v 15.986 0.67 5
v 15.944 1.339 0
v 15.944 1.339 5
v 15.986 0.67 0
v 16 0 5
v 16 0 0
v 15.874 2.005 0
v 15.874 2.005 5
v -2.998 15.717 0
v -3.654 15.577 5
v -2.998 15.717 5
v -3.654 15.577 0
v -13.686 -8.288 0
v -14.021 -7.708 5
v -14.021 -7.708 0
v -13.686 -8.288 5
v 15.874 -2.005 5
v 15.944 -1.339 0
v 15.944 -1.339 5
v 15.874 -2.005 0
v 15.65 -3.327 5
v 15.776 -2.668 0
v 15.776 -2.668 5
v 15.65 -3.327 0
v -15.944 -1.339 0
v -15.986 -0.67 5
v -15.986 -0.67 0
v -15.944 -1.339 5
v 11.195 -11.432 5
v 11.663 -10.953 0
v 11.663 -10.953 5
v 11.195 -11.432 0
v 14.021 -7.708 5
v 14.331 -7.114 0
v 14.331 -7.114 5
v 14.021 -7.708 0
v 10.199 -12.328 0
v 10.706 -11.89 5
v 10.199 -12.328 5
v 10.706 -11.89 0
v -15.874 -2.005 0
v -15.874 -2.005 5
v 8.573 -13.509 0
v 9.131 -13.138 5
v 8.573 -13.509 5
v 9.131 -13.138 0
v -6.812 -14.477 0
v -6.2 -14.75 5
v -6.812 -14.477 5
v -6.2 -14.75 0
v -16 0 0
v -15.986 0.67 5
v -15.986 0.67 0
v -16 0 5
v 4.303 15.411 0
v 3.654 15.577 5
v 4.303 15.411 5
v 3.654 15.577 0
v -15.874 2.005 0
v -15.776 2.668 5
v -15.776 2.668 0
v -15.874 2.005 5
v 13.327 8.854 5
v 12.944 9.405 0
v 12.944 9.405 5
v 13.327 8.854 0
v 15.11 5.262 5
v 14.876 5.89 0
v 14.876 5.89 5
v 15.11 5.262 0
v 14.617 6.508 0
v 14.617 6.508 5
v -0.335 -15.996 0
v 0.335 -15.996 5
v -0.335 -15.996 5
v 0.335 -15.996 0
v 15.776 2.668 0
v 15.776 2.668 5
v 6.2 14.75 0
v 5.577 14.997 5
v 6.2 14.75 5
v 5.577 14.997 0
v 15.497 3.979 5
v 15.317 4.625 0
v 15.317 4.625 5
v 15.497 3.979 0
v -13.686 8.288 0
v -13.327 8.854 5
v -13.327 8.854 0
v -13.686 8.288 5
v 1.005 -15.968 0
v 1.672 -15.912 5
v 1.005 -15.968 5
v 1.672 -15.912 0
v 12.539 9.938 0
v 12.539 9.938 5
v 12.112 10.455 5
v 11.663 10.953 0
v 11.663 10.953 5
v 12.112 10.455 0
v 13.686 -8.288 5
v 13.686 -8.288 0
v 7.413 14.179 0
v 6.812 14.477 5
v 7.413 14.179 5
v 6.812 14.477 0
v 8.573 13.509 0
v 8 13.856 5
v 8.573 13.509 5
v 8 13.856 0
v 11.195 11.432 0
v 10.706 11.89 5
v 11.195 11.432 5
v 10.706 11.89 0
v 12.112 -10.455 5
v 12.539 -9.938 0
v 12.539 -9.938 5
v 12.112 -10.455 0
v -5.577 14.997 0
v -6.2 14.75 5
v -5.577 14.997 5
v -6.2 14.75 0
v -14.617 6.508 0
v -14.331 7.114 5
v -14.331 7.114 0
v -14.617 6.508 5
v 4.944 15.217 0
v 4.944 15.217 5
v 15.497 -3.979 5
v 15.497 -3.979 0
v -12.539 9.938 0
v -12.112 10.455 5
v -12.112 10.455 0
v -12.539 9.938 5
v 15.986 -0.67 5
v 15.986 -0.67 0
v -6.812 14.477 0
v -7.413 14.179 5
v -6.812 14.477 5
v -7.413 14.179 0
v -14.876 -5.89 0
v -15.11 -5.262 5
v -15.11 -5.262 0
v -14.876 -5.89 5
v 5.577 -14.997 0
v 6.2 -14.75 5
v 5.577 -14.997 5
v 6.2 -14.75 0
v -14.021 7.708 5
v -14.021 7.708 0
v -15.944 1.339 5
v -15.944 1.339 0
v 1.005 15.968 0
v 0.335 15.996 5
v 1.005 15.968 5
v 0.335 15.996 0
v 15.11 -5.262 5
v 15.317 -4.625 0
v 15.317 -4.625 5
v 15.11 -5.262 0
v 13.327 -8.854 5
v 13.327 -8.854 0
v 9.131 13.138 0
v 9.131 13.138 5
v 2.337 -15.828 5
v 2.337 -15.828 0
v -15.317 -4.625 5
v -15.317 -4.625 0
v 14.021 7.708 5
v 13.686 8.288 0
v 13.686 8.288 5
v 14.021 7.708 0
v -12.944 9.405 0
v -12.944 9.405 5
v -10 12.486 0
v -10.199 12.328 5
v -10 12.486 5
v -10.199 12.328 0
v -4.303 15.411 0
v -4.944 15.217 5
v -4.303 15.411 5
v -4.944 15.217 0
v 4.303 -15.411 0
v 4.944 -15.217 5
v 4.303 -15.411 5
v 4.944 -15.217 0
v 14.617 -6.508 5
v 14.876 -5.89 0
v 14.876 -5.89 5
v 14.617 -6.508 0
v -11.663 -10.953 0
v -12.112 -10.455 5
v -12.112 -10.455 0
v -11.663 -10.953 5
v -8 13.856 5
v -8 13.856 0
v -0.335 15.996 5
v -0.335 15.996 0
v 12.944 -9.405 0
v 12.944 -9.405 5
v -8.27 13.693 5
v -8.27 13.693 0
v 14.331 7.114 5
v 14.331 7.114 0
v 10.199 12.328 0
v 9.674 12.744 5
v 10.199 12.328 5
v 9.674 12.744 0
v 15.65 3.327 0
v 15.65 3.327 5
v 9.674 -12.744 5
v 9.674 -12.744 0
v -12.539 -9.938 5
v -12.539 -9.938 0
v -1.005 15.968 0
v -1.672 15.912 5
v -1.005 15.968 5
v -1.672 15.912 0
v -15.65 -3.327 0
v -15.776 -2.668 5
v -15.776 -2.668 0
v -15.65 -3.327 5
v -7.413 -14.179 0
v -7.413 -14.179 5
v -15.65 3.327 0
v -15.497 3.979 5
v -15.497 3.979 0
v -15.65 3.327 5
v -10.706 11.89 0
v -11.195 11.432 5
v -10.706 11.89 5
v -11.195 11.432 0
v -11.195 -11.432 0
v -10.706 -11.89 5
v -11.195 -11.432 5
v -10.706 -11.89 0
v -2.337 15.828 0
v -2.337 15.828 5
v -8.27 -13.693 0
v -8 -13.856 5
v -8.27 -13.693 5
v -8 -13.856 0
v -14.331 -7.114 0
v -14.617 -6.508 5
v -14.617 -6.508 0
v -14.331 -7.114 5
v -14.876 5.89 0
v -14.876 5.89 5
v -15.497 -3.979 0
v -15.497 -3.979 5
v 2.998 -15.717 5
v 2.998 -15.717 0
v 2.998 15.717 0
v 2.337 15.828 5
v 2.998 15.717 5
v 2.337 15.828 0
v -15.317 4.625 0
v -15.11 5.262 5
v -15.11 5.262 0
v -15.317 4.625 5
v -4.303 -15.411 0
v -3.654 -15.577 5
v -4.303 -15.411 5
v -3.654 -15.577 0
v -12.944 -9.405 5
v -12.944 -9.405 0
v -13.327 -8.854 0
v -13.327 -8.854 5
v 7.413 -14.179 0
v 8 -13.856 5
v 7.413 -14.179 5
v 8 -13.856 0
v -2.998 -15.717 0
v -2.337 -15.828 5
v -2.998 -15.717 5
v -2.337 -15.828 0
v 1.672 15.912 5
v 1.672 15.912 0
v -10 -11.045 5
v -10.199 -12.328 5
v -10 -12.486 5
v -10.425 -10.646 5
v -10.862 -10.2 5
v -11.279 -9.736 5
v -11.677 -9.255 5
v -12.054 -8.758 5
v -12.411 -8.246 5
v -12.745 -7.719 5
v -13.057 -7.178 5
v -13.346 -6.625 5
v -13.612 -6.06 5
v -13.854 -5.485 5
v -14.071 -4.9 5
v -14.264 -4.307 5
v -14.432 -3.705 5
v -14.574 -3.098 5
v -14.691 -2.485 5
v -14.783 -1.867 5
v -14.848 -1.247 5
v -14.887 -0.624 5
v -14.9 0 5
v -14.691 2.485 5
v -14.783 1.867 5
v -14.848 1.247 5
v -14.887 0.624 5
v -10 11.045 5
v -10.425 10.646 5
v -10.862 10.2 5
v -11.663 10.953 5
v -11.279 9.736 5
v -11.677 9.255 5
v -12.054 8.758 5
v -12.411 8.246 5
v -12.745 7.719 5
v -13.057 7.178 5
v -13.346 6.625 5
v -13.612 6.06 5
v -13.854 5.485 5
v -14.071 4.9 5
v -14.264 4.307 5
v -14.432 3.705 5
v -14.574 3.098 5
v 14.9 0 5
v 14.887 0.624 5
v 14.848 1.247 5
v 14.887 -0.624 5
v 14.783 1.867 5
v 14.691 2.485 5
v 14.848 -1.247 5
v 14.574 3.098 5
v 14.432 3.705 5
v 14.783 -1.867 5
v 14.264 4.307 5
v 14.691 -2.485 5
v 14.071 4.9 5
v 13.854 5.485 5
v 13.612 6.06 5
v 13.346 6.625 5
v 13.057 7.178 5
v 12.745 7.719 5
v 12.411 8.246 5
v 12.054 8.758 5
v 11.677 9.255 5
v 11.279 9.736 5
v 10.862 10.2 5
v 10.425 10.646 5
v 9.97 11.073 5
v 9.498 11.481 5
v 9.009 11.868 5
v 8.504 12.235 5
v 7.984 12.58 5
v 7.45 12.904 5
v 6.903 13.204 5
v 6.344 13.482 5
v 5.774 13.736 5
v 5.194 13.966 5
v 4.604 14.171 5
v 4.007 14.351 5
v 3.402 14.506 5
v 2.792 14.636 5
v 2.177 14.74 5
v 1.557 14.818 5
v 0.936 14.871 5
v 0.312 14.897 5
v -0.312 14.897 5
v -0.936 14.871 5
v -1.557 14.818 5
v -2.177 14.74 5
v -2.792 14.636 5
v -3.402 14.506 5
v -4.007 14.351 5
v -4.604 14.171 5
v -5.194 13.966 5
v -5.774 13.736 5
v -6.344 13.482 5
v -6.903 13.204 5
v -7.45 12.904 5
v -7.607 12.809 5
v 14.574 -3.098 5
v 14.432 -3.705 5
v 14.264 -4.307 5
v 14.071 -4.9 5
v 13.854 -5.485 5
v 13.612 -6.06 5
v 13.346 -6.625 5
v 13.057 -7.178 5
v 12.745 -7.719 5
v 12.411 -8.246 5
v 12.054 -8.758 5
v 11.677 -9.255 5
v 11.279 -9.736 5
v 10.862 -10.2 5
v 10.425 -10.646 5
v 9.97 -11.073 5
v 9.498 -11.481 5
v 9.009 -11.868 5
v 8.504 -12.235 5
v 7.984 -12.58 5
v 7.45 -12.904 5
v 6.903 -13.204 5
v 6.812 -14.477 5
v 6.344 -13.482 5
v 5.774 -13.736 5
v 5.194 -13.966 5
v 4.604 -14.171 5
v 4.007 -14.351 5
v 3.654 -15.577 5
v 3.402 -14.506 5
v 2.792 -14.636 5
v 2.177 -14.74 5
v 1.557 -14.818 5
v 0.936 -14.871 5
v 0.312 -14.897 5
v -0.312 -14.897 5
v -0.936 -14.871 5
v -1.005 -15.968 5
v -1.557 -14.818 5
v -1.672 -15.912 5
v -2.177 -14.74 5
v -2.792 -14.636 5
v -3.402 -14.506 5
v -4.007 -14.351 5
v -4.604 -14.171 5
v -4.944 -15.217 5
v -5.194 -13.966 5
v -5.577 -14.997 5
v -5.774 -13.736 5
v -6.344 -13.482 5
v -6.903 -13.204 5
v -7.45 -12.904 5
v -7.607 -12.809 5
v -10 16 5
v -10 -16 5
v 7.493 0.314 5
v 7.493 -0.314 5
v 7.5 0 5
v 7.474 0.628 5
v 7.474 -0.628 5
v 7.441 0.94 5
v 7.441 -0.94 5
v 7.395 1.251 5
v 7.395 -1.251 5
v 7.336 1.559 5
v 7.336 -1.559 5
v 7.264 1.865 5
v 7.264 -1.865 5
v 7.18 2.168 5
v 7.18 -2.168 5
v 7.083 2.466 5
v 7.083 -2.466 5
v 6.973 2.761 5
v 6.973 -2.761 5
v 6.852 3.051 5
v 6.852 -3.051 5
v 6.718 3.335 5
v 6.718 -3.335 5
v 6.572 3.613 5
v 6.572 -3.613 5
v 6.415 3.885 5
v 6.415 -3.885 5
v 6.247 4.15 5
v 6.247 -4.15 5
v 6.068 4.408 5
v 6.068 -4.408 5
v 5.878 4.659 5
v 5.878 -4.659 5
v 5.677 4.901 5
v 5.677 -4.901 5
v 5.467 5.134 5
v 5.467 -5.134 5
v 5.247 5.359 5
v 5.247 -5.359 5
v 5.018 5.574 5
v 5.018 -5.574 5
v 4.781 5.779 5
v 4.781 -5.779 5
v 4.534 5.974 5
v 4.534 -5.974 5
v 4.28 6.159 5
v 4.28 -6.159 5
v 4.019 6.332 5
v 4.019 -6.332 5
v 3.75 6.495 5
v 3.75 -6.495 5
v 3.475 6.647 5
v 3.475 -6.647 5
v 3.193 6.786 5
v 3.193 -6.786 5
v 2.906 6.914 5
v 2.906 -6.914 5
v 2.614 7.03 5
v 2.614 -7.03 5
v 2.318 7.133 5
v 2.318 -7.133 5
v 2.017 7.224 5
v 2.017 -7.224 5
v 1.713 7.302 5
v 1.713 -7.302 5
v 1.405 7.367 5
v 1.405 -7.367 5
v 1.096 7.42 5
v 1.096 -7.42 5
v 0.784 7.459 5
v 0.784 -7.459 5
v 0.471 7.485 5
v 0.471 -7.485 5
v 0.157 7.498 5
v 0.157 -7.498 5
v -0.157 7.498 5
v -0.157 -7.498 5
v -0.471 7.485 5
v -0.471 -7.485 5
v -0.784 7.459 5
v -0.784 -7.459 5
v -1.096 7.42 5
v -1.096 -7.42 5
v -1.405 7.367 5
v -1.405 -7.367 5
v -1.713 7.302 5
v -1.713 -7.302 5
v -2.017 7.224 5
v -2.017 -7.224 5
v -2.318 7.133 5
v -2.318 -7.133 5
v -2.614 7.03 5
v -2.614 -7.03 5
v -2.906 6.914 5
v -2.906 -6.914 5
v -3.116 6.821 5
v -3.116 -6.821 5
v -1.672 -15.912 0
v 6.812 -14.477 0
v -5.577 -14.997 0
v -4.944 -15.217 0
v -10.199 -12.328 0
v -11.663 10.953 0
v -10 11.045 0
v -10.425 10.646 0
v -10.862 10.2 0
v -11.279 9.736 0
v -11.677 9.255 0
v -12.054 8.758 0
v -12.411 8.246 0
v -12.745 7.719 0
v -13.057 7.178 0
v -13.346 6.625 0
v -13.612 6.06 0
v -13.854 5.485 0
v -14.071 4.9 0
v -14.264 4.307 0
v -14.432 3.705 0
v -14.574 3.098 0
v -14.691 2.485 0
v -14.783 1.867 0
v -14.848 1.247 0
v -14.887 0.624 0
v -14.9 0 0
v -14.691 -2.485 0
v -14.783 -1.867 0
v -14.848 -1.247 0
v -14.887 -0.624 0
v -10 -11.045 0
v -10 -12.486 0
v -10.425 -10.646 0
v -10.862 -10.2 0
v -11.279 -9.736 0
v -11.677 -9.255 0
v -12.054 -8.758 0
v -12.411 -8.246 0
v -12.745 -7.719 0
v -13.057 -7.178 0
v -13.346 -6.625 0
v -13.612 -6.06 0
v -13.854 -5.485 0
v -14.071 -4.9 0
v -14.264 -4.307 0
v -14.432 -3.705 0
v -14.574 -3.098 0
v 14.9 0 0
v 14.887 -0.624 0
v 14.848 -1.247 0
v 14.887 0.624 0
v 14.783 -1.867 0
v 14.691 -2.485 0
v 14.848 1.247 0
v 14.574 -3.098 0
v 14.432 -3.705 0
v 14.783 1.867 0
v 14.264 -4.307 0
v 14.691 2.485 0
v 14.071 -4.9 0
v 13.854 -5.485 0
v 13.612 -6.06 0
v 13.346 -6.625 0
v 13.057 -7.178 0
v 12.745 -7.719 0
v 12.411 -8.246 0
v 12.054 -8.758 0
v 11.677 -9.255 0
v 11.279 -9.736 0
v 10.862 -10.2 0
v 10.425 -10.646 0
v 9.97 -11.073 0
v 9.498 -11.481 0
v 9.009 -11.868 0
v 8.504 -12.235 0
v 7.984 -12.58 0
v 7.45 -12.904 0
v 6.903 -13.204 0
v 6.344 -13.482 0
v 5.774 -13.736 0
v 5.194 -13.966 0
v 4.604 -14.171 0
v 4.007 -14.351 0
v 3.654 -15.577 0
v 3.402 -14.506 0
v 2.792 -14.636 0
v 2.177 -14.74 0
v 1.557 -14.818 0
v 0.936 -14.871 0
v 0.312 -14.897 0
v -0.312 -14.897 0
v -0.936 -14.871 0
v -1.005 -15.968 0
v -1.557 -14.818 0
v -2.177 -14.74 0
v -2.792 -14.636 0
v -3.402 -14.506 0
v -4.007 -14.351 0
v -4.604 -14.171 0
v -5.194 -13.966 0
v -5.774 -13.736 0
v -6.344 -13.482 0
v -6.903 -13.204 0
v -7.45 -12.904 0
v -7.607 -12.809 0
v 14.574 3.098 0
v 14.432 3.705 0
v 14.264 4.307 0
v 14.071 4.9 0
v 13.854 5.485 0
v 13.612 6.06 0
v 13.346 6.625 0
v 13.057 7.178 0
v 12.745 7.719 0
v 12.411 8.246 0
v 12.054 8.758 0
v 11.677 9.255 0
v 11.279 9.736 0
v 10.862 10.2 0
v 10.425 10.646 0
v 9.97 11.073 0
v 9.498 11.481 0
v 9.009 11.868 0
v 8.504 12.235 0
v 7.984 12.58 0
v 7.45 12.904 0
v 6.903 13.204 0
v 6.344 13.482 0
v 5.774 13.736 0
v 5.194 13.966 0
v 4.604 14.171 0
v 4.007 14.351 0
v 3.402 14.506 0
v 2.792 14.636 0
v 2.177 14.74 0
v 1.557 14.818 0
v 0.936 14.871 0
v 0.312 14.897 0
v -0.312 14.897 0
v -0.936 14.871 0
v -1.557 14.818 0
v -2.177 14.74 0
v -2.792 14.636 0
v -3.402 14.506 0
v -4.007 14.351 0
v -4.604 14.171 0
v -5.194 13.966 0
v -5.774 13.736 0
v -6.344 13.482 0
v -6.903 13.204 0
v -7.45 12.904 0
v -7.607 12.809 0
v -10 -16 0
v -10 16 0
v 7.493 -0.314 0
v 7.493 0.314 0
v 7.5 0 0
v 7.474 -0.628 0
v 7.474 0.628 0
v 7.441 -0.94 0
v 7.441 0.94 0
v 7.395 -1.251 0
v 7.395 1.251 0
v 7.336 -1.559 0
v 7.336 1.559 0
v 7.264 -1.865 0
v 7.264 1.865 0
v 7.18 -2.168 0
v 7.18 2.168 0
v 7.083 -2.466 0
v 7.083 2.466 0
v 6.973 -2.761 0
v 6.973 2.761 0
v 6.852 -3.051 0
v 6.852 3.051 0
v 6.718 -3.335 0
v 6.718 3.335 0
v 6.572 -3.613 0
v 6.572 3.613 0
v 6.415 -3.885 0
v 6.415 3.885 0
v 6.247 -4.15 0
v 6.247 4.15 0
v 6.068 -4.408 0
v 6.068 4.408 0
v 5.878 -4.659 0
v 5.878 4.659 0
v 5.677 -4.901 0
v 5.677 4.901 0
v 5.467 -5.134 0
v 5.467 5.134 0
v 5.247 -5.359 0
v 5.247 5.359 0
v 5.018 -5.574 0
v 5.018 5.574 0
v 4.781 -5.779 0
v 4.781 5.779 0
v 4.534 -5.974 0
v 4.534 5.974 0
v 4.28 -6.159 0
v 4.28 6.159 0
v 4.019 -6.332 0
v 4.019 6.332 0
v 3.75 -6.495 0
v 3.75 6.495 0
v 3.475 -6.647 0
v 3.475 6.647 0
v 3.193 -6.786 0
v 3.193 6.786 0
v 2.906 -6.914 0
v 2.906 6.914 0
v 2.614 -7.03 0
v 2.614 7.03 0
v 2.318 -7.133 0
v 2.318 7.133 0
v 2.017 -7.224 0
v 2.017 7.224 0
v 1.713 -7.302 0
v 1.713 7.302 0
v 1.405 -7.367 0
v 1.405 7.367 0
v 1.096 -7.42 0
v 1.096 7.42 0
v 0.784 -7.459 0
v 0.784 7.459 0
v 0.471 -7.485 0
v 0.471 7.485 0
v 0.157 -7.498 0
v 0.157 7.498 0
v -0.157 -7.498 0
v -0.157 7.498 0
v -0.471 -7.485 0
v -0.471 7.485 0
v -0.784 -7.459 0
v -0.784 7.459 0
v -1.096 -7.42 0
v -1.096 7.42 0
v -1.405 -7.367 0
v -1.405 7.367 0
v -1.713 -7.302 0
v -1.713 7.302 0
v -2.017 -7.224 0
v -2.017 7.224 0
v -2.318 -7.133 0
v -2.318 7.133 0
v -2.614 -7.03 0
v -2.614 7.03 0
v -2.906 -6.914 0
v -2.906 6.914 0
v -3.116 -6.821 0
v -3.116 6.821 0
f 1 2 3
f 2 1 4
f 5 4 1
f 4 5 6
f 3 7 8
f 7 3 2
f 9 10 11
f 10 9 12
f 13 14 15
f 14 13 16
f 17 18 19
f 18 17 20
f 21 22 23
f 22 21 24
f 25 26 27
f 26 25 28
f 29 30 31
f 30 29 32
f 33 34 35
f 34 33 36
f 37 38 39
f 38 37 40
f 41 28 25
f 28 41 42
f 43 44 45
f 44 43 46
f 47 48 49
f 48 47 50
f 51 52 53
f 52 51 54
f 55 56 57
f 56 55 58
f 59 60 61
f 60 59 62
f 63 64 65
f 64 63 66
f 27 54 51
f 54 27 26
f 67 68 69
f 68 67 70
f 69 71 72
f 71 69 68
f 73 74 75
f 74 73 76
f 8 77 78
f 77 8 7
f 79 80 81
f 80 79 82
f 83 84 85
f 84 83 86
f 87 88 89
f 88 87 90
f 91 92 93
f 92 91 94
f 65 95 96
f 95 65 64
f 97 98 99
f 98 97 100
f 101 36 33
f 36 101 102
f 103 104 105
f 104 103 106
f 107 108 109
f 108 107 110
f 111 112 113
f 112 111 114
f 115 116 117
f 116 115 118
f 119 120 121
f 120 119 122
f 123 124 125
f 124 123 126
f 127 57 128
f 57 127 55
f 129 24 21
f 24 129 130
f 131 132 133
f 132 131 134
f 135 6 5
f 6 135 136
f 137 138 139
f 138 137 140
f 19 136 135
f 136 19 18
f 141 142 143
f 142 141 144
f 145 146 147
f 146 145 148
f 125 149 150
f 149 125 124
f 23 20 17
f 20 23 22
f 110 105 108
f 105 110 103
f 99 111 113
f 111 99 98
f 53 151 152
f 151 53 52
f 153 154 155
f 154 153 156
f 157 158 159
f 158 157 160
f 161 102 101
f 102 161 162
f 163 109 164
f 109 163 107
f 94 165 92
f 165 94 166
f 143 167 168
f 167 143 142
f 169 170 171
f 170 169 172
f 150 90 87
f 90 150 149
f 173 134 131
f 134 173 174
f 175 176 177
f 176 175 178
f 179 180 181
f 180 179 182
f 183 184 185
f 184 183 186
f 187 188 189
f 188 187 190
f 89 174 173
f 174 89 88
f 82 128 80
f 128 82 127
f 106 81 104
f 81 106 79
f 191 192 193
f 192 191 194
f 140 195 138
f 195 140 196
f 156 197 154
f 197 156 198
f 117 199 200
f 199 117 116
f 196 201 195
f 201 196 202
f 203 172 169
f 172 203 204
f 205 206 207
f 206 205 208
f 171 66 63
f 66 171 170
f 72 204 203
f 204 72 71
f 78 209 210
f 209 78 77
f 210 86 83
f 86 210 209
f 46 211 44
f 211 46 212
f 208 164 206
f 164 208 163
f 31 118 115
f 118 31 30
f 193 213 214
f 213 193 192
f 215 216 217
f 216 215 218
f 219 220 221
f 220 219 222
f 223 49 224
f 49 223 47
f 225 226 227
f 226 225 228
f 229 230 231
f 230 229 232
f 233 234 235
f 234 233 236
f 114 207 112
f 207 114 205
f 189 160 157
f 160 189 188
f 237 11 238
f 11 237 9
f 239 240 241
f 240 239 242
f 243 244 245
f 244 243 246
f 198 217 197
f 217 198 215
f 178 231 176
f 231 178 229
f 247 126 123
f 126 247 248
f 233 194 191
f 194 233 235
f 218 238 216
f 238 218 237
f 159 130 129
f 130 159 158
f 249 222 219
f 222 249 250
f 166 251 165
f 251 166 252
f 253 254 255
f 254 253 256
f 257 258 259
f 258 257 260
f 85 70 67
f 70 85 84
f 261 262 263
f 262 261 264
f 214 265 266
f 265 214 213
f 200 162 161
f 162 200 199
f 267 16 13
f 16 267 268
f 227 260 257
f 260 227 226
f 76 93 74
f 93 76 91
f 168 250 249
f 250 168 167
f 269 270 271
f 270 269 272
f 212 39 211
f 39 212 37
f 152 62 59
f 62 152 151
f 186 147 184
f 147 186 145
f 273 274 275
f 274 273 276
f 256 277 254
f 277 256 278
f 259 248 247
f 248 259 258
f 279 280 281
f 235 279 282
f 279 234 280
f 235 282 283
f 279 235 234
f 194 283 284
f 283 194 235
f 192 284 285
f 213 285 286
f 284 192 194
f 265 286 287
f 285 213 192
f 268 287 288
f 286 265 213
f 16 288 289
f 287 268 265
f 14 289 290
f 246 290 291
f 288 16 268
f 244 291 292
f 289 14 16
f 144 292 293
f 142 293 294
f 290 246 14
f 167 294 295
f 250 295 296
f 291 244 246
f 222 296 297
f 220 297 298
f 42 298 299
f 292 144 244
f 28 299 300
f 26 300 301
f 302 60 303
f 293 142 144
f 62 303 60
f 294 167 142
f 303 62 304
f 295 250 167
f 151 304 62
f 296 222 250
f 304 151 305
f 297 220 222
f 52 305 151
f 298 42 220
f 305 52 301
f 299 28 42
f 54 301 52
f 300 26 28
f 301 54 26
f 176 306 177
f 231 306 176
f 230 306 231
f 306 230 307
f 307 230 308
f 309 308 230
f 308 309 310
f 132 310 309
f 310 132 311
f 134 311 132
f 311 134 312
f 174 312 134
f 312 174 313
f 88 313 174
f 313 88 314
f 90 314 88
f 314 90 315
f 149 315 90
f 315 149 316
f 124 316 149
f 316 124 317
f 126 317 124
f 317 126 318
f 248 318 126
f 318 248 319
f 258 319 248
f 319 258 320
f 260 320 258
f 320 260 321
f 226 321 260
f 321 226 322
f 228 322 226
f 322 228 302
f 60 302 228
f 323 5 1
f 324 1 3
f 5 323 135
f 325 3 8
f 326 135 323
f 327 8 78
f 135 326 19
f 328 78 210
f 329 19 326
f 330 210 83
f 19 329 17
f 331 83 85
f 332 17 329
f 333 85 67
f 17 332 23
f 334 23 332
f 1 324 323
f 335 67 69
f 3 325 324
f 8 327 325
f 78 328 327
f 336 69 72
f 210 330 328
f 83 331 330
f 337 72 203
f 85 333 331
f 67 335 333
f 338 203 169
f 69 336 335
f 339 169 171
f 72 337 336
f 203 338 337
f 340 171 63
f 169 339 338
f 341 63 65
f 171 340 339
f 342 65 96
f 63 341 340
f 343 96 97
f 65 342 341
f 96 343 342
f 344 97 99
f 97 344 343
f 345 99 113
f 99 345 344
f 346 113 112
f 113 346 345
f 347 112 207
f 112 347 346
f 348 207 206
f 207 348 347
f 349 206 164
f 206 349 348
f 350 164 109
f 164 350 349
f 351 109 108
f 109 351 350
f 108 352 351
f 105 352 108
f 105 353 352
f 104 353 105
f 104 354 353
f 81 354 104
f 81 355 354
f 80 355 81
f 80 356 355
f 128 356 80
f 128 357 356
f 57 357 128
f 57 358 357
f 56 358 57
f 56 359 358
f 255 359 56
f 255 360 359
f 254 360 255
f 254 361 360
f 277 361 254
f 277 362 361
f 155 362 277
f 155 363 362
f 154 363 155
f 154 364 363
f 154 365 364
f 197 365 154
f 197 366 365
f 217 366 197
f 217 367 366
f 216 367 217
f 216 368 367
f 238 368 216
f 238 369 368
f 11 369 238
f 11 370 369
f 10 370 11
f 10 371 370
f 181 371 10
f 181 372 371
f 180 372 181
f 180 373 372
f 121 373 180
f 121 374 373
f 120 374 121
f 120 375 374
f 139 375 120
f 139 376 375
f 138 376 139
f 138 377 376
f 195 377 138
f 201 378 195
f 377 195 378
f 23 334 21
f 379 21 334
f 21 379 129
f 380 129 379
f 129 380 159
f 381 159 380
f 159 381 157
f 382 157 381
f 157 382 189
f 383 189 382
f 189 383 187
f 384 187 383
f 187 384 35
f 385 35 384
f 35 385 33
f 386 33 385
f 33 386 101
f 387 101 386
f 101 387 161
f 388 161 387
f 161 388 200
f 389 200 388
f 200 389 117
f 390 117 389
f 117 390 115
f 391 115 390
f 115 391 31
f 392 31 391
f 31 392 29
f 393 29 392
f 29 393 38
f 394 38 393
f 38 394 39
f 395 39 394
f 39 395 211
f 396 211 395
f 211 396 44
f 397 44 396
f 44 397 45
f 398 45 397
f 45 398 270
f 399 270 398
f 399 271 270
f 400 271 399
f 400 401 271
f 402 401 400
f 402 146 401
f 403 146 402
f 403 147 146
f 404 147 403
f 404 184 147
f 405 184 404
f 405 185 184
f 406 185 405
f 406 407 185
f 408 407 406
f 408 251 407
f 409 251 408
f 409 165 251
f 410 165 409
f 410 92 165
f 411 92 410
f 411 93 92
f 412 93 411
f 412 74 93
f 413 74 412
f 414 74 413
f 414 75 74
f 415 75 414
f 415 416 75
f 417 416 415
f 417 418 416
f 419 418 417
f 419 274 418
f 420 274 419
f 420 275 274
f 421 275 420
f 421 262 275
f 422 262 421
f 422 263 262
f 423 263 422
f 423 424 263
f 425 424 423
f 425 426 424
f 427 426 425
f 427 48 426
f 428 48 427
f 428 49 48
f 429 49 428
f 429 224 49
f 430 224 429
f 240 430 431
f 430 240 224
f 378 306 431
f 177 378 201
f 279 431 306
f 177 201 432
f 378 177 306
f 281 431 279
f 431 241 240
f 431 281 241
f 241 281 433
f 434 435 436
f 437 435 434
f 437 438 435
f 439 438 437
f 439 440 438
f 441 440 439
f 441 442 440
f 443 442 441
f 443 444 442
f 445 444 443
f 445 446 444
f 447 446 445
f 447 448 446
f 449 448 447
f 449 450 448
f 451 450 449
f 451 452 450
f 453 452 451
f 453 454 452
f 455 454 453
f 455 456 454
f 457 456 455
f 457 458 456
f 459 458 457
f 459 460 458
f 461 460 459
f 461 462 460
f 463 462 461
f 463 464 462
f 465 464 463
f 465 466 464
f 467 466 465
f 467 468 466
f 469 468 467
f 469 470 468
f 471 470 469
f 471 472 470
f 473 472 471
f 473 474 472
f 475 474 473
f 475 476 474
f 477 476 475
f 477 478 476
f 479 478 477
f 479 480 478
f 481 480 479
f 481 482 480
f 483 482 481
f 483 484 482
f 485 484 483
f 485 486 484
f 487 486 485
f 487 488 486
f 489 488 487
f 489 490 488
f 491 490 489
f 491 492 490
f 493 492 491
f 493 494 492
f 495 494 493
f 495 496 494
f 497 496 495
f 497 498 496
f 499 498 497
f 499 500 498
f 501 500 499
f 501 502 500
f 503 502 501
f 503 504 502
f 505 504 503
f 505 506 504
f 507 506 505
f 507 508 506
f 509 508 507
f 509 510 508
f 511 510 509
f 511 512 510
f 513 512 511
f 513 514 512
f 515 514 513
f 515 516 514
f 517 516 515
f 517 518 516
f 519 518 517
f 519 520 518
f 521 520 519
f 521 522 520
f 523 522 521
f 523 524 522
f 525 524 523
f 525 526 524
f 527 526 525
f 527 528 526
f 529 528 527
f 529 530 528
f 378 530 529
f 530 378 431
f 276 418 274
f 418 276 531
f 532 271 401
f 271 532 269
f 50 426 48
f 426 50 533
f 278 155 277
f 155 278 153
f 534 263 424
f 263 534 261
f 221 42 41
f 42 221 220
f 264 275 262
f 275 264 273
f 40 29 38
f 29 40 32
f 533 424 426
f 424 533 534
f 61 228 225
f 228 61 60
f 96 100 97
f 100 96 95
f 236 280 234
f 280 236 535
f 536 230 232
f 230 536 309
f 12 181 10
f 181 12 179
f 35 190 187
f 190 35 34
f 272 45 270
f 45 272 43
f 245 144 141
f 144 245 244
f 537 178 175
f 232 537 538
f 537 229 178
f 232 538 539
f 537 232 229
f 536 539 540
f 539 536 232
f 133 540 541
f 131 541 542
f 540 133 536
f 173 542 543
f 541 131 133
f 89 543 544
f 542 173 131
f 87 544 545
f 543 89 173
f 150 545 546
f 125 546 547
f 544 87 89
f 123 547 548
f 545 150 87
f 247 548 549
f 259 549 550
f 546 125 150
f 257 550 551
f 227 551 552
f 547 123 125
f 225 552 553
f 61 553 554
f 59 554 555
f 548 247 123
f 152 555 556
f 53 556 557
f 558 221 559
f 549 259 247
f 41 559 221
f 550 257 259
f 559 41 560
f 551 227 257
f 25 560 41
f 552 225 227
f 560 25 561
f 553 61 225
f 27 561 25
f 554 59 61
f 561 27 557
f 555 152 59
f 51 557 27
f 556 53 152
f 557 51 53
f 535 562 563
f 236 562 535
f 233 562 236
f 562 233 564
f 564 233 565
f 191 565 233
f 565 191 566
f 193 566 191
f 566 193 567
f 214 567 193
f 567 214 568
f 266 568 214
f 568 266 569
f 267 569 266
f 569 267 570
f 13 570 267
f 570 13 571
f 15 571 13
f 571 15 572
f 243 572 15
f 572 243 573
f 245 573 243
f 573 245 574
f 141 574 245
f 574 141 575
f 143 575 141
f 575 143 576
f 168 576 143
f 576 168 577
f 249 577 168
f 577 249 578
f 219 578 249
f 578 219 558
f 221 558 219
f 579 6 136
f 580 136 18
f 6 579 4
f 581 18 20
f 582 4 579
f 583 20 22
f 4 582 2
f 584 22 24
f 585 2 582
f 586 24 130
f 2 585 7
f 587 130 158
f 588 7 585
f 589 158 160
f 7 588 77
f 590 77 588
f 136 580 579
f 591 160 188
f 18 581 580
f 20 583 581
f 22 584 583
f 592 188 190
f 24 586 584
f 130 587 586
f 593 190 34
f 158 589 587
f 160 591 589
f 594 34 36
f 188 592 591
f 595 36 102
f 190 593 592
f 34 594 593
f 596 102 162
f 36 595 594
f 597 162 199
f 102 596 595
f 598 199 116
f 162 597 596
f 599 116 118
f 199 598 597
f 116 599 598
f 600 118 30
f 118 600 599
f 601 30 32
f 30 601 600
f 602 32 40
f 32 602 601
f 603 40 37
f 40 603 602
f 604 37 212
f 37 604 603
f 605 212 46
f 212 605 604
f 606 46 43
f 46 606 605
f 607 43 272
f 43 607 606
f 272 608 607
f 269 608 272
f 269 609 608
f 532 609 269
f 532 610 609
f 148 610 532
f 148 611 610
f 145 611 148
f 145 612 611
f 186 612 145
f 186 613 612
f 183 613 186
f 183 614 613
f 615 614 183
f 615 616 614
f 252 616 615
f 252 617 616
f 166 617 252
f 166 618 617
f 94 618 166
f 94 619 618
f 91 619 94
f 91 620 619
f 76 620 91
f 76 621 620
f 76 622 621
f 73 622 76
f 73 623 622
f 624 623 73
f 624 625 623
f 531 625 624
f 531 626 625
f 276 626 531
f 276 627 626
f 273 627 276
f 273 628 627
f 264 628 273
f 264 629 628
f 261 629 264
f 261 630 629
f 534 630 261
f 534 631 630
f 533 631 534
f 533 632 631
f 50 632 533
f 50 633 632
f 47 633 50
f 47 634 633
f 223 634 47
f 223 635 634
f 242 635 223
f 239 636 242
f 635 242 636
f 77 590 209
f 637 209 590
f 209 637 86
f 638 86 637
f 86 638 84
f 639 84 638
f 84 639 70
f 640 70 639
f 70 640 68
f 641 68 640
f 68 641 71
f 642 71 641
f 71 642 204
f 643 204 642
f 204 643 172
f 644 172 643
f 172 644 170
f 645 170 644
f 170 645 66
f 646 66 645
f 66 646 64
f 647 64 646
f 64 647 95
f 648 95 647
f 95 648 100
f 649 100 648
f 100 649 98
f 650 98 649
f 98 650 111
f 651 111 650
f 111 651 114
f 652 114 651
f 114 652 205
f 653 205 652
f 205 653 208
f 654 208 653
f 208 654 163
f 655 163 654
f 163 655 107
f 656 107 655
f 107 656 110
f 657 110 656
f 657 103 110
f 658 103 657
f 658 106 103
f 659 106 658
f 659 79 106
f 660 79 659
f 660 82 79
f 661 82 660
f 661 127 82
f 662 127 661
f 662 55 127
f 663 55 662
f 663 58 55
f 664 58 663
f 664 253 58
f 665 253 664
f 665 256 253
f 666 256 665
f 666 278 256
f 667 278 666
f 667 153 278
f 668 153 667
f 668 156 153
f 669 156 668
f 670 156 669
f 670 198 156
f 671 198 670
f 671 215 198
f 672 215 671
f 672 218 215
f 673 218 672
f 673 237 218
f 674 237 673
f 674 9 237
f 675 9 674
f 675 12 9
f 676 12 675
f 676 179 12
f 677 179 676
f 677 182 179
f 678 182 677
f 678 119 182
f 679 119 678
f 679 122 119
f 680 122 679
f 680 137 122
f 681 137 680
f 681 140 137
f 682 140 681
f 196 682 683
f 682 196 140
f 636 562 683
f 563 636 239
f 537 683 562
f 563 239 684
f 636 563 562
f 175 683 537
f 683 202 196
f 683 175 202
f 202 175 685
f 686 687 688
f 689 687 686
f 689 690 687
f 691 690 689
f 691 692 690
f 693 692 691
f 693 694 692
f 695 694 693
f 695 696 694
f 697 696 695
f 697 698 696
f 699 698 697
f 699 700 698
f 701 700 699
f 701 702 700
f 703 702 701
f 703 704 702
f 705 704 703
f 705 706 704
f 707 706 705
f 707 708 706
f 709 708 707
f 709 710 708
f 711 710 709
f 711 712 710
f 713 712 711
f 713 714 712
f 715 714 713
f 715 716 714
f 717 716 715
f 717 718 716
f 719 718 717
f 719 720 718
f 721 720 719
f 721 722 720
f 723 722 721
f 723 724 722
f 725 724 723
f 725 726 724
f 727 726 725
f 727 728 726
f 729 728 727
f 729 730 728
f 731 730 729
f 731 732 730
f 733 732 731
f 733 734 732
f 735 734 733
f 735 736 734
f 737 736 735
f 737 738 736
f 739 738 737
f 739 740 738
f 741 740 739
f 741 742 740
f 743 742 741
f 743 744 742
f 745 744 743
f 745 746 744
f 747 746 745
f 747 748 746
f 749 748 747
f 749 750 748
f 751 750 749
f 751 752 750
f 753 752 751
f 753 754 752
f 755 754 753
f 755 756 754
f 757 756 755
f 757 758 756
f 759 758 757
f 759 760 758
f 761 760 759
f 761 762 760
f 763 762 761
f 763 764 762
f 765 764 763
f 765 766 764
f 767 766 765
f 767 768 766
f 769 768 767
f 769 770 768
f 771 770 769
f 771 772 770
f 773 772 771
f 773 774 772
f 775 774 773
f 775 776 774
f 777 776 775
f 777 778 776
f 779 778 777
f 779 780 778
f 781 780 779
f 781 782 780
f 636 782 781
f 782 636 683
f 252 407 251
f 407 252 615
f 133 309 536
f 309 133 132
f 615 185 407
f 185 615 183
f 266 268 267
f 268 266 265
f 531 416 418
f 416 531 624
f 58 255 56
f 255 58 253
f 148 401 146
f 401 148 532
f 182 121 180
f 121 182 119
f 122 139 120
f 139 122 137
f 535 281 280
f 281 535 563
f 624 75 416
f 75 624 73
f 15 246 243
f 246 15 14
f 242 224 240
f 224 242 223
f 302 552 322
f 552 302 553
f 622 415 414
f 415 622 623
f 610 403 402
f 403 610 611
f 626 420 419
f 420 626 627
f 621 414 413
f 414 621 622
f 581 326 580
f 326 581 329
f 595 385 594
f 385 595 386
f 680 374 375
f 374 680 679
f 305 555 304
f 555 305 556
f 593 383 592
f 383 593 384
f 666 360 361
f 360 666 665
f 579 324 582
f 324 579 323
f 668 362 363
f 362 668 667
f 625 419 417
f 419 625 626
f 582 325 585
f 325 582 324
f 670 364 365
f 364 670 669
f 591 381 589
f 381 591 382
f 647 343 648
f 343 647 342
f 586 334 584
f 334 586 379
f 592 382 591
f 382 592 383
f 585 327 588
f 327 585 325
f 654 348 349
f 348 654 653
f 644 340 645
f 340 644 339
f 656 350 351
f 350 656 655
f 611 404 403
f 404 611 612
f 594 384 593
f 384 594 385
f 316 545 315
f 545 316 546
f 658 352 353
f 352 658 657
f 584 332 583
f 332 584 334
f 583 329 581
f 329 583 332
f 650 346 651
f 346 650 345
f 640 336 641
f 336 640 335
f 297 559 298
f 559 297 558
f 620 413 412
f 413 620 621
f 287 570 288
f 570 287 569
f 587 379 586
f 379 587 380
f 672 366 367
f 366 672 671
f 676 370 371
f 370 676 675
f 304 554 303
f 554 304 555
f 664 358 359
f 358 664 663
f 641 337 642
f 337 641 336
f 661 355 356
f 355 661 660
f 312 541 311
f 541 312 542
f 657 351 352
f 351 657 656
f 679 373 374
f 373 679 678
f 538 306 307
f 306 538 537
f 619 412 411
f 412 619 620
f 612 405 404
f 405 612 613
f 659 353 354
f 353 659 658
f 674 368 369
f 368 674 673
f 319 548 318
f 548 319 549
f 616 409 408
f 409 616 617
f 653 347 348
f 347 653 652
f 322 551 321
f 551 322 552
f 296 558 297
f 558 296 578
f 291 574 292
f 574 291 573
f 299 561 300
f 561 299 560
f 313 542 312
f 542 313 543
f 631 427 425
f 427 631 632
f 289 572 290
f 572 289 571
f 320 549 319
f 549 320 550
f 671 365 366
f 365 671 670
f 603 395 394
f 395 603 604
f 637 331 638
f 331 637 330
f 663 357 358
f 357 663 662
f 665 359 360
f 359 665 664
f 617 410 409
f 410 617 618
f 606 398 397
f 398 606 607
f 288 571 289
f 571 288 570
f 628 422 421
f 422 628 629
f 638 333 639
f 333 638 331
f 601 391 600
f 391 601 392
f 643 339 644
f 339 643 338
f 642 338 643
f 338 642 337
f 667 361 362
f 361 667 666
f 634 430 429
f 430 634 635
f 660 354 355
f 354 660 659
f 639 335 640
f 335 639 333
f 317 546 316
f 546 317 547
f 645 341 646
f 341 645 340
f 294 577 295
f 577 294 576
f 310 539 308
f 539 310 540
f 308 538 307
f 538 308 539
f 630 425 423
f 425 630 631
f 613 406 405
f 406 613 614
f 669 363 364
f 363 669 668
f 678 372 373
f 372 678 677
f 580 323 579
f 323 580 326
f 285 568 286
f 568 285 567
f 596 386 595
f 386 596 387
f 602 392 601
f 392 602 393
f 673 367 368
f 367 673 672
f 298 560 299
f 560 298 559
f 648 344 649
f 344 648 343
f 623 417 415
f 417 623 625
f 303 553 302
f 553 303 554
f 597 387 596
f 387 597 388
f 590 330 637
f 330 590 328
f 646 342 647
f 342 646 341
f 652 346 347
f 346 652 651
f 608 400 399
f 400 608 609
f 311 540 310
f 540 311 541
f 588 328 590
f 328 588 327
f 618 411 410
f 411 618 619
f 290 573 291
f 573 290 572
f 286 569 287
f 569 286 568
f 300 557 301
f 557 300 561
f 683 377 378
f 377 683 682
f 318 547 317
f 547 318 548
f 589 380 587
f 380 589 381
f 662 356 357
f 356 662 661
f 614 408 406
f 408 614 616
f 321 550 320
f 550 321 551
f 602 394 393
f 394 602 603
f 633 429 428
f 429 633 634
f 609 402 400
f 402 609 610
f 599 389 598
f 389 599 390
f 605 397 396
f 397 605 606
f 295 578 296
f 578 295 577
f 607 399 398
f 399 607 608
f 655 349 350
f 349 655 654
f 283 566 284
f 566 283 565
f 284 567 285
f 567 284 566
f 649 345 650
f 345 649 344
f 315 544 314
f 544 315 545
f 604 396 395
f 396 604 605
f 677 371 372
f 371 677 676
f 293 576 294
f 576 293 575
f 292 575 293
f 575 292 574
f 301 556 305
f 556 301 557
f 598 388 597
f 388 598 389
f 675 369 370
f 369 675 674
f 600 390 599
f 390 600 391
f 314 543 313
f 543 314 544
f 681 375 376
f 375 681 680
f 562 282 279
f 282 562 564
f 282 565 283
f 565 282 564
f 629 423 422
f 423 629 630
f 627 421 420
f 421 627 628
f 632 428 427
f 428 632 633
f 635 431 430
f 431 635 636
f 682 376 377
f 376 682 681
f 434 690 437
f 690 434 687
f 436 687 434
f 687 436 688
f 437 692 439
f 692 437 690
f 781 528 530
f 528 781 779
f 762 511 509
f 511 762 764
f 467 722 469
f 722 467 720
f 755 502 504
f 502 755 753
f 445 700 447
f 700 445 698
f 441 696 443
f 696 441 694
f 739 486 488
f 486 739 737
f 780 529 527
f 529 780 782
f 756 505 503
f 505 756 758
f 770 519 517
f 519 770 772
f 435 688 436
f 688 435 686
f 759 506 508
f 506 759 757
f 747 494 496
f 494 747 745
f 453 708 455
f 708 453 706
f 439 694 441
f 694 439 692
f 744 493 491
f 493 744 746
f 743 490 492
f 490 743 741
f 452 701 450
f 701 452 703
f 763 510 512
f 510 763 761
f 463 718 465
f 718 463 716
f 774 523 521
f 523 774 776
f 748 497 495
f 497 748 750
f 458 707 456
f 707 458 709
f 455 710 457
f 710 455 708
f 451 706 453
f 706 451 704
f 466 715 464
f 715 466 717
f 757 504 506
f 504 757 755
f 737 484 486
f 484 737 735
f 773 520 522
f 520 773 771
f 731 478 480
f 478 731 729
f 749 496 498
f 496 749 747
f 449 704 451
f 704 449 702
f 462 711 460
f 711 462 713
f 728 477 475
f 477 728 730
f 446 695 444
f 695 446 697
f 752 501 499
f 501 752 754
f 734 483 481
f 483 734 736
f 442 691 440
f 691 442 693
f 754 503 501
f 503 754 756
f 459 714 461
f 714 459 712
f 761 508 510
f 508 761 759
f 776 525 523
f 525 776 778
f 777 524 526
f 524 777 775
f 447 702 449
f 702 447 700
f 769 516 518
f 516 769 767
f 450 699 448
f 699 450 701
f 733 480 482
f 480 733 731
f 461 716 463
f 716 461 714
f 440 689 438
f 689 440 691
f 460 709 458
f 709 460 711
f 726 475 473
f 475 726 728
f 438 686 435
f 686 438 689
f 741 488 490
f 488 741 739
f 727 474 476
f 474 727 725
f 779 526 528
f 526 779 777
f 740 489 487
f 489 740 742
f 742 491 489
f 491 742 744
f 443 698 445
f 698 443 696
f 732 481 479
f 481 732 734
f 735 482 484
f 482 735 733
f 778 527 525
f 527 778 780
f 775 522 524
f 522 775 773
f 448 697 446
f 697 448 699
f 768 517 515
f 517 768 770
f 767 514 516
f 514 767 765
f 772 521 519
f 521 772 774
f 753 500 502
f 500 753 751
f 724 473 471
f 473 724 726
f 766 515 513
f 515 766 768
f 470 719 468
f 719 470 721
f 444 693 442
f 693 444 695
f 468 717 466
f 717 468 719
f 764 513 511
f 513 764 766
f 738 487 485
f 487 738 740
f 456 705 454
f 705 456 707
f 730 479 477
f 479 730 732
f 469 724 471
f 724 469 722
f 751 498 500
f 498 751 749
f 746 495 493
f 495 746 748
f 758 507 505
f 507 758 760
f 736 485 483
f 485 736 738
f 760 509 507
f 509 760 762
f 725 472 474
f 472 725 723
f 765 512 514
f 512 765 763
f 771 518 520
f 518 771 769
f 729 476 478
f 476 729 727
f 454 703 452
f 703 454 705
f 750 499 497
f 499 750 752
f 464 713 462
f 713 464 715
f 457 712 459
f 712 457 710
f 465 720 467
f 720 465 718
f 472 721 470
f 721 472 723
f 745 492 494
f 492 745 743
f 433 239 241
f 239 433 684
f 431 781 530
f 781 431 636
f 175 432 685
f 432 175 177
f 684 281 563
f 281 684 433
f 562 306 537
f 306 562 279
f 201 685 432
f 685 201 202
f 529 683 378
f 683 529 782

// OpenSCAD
/* 
 Side Ilumination  Filters v1.0

An open source filter for a costume side ilumiation that can be adapted to any compound microscope.

This 3D file is designed to be the third optical filter for contrast illumination technics made for microscopy enthusiast and professionals.
     
Source :https://github.com/Usuy-Leon/DIY_Dark-Field-Filters

This project is an Open Source project,
by Usuy D. Leon, 2025.03.26
Microscopist, National University of Colombia, Bogota DC,

  */

// // // // // // // // // // // // // // // // // // // // // // // // // //
/*                        - User Parameters -                             */
 
height = 5;                 // Total height of the filter
outer_dia = 32;             // Outer diameter of the main structure
inner_dia = 15;             // Diameter of the light-blocking center cylinder
border_thickness = 2.2;       // Thickness of the outer border
$fn = 150;                  // Resolution

/*                        - Triangle Parameters -                             */
points = [
    [outer_dia /2, 12],
    [outer_dia, 0], 
    [0, 0]
];


// // // // // // // // // // // // // // // // // // // // // // // // // // 
/*                            - Computed Values -                         */
border_inner_dia = outer_dia - border_thickness; 

// // // // // // // // // // // // // // // // // // // // // // // // // //
/*                            - Modules -                                 */
// Create the extruded triangle directly 
module triangle(){
translate([-10, 16, 0]) 
rotate(270)
linear_extrude(height = height) 
    polygon(points);
}
module moon(diameter = outer_dia, height) { 
    difference() {
        cylinder(2, d = outer_dia);
        
        // Cut lower half using a cube larger than the cylinder
        translate([0, -outer_dia, 0]) 
            cube([diameter, outer_dia*2, 2]);
    }
}

module outer_ring() {
    difference() {
        cylinder(height, d = outer_dia);
        cylinder(height, d = border_inner_dia);  // Use computed border diameter
    }
}
// // // // // // // // // // // // // // // // // // // // // // // // // //
/*                            - Main Assembly -                           */
  
union() {
    cylinder(height, d = inner_dia);  // Light-blocking center
    triangle();      // Subtract the moon shape from the border
    
    difference() {
        outer_ring();       // Border with accurate thickness
 
    }
}
